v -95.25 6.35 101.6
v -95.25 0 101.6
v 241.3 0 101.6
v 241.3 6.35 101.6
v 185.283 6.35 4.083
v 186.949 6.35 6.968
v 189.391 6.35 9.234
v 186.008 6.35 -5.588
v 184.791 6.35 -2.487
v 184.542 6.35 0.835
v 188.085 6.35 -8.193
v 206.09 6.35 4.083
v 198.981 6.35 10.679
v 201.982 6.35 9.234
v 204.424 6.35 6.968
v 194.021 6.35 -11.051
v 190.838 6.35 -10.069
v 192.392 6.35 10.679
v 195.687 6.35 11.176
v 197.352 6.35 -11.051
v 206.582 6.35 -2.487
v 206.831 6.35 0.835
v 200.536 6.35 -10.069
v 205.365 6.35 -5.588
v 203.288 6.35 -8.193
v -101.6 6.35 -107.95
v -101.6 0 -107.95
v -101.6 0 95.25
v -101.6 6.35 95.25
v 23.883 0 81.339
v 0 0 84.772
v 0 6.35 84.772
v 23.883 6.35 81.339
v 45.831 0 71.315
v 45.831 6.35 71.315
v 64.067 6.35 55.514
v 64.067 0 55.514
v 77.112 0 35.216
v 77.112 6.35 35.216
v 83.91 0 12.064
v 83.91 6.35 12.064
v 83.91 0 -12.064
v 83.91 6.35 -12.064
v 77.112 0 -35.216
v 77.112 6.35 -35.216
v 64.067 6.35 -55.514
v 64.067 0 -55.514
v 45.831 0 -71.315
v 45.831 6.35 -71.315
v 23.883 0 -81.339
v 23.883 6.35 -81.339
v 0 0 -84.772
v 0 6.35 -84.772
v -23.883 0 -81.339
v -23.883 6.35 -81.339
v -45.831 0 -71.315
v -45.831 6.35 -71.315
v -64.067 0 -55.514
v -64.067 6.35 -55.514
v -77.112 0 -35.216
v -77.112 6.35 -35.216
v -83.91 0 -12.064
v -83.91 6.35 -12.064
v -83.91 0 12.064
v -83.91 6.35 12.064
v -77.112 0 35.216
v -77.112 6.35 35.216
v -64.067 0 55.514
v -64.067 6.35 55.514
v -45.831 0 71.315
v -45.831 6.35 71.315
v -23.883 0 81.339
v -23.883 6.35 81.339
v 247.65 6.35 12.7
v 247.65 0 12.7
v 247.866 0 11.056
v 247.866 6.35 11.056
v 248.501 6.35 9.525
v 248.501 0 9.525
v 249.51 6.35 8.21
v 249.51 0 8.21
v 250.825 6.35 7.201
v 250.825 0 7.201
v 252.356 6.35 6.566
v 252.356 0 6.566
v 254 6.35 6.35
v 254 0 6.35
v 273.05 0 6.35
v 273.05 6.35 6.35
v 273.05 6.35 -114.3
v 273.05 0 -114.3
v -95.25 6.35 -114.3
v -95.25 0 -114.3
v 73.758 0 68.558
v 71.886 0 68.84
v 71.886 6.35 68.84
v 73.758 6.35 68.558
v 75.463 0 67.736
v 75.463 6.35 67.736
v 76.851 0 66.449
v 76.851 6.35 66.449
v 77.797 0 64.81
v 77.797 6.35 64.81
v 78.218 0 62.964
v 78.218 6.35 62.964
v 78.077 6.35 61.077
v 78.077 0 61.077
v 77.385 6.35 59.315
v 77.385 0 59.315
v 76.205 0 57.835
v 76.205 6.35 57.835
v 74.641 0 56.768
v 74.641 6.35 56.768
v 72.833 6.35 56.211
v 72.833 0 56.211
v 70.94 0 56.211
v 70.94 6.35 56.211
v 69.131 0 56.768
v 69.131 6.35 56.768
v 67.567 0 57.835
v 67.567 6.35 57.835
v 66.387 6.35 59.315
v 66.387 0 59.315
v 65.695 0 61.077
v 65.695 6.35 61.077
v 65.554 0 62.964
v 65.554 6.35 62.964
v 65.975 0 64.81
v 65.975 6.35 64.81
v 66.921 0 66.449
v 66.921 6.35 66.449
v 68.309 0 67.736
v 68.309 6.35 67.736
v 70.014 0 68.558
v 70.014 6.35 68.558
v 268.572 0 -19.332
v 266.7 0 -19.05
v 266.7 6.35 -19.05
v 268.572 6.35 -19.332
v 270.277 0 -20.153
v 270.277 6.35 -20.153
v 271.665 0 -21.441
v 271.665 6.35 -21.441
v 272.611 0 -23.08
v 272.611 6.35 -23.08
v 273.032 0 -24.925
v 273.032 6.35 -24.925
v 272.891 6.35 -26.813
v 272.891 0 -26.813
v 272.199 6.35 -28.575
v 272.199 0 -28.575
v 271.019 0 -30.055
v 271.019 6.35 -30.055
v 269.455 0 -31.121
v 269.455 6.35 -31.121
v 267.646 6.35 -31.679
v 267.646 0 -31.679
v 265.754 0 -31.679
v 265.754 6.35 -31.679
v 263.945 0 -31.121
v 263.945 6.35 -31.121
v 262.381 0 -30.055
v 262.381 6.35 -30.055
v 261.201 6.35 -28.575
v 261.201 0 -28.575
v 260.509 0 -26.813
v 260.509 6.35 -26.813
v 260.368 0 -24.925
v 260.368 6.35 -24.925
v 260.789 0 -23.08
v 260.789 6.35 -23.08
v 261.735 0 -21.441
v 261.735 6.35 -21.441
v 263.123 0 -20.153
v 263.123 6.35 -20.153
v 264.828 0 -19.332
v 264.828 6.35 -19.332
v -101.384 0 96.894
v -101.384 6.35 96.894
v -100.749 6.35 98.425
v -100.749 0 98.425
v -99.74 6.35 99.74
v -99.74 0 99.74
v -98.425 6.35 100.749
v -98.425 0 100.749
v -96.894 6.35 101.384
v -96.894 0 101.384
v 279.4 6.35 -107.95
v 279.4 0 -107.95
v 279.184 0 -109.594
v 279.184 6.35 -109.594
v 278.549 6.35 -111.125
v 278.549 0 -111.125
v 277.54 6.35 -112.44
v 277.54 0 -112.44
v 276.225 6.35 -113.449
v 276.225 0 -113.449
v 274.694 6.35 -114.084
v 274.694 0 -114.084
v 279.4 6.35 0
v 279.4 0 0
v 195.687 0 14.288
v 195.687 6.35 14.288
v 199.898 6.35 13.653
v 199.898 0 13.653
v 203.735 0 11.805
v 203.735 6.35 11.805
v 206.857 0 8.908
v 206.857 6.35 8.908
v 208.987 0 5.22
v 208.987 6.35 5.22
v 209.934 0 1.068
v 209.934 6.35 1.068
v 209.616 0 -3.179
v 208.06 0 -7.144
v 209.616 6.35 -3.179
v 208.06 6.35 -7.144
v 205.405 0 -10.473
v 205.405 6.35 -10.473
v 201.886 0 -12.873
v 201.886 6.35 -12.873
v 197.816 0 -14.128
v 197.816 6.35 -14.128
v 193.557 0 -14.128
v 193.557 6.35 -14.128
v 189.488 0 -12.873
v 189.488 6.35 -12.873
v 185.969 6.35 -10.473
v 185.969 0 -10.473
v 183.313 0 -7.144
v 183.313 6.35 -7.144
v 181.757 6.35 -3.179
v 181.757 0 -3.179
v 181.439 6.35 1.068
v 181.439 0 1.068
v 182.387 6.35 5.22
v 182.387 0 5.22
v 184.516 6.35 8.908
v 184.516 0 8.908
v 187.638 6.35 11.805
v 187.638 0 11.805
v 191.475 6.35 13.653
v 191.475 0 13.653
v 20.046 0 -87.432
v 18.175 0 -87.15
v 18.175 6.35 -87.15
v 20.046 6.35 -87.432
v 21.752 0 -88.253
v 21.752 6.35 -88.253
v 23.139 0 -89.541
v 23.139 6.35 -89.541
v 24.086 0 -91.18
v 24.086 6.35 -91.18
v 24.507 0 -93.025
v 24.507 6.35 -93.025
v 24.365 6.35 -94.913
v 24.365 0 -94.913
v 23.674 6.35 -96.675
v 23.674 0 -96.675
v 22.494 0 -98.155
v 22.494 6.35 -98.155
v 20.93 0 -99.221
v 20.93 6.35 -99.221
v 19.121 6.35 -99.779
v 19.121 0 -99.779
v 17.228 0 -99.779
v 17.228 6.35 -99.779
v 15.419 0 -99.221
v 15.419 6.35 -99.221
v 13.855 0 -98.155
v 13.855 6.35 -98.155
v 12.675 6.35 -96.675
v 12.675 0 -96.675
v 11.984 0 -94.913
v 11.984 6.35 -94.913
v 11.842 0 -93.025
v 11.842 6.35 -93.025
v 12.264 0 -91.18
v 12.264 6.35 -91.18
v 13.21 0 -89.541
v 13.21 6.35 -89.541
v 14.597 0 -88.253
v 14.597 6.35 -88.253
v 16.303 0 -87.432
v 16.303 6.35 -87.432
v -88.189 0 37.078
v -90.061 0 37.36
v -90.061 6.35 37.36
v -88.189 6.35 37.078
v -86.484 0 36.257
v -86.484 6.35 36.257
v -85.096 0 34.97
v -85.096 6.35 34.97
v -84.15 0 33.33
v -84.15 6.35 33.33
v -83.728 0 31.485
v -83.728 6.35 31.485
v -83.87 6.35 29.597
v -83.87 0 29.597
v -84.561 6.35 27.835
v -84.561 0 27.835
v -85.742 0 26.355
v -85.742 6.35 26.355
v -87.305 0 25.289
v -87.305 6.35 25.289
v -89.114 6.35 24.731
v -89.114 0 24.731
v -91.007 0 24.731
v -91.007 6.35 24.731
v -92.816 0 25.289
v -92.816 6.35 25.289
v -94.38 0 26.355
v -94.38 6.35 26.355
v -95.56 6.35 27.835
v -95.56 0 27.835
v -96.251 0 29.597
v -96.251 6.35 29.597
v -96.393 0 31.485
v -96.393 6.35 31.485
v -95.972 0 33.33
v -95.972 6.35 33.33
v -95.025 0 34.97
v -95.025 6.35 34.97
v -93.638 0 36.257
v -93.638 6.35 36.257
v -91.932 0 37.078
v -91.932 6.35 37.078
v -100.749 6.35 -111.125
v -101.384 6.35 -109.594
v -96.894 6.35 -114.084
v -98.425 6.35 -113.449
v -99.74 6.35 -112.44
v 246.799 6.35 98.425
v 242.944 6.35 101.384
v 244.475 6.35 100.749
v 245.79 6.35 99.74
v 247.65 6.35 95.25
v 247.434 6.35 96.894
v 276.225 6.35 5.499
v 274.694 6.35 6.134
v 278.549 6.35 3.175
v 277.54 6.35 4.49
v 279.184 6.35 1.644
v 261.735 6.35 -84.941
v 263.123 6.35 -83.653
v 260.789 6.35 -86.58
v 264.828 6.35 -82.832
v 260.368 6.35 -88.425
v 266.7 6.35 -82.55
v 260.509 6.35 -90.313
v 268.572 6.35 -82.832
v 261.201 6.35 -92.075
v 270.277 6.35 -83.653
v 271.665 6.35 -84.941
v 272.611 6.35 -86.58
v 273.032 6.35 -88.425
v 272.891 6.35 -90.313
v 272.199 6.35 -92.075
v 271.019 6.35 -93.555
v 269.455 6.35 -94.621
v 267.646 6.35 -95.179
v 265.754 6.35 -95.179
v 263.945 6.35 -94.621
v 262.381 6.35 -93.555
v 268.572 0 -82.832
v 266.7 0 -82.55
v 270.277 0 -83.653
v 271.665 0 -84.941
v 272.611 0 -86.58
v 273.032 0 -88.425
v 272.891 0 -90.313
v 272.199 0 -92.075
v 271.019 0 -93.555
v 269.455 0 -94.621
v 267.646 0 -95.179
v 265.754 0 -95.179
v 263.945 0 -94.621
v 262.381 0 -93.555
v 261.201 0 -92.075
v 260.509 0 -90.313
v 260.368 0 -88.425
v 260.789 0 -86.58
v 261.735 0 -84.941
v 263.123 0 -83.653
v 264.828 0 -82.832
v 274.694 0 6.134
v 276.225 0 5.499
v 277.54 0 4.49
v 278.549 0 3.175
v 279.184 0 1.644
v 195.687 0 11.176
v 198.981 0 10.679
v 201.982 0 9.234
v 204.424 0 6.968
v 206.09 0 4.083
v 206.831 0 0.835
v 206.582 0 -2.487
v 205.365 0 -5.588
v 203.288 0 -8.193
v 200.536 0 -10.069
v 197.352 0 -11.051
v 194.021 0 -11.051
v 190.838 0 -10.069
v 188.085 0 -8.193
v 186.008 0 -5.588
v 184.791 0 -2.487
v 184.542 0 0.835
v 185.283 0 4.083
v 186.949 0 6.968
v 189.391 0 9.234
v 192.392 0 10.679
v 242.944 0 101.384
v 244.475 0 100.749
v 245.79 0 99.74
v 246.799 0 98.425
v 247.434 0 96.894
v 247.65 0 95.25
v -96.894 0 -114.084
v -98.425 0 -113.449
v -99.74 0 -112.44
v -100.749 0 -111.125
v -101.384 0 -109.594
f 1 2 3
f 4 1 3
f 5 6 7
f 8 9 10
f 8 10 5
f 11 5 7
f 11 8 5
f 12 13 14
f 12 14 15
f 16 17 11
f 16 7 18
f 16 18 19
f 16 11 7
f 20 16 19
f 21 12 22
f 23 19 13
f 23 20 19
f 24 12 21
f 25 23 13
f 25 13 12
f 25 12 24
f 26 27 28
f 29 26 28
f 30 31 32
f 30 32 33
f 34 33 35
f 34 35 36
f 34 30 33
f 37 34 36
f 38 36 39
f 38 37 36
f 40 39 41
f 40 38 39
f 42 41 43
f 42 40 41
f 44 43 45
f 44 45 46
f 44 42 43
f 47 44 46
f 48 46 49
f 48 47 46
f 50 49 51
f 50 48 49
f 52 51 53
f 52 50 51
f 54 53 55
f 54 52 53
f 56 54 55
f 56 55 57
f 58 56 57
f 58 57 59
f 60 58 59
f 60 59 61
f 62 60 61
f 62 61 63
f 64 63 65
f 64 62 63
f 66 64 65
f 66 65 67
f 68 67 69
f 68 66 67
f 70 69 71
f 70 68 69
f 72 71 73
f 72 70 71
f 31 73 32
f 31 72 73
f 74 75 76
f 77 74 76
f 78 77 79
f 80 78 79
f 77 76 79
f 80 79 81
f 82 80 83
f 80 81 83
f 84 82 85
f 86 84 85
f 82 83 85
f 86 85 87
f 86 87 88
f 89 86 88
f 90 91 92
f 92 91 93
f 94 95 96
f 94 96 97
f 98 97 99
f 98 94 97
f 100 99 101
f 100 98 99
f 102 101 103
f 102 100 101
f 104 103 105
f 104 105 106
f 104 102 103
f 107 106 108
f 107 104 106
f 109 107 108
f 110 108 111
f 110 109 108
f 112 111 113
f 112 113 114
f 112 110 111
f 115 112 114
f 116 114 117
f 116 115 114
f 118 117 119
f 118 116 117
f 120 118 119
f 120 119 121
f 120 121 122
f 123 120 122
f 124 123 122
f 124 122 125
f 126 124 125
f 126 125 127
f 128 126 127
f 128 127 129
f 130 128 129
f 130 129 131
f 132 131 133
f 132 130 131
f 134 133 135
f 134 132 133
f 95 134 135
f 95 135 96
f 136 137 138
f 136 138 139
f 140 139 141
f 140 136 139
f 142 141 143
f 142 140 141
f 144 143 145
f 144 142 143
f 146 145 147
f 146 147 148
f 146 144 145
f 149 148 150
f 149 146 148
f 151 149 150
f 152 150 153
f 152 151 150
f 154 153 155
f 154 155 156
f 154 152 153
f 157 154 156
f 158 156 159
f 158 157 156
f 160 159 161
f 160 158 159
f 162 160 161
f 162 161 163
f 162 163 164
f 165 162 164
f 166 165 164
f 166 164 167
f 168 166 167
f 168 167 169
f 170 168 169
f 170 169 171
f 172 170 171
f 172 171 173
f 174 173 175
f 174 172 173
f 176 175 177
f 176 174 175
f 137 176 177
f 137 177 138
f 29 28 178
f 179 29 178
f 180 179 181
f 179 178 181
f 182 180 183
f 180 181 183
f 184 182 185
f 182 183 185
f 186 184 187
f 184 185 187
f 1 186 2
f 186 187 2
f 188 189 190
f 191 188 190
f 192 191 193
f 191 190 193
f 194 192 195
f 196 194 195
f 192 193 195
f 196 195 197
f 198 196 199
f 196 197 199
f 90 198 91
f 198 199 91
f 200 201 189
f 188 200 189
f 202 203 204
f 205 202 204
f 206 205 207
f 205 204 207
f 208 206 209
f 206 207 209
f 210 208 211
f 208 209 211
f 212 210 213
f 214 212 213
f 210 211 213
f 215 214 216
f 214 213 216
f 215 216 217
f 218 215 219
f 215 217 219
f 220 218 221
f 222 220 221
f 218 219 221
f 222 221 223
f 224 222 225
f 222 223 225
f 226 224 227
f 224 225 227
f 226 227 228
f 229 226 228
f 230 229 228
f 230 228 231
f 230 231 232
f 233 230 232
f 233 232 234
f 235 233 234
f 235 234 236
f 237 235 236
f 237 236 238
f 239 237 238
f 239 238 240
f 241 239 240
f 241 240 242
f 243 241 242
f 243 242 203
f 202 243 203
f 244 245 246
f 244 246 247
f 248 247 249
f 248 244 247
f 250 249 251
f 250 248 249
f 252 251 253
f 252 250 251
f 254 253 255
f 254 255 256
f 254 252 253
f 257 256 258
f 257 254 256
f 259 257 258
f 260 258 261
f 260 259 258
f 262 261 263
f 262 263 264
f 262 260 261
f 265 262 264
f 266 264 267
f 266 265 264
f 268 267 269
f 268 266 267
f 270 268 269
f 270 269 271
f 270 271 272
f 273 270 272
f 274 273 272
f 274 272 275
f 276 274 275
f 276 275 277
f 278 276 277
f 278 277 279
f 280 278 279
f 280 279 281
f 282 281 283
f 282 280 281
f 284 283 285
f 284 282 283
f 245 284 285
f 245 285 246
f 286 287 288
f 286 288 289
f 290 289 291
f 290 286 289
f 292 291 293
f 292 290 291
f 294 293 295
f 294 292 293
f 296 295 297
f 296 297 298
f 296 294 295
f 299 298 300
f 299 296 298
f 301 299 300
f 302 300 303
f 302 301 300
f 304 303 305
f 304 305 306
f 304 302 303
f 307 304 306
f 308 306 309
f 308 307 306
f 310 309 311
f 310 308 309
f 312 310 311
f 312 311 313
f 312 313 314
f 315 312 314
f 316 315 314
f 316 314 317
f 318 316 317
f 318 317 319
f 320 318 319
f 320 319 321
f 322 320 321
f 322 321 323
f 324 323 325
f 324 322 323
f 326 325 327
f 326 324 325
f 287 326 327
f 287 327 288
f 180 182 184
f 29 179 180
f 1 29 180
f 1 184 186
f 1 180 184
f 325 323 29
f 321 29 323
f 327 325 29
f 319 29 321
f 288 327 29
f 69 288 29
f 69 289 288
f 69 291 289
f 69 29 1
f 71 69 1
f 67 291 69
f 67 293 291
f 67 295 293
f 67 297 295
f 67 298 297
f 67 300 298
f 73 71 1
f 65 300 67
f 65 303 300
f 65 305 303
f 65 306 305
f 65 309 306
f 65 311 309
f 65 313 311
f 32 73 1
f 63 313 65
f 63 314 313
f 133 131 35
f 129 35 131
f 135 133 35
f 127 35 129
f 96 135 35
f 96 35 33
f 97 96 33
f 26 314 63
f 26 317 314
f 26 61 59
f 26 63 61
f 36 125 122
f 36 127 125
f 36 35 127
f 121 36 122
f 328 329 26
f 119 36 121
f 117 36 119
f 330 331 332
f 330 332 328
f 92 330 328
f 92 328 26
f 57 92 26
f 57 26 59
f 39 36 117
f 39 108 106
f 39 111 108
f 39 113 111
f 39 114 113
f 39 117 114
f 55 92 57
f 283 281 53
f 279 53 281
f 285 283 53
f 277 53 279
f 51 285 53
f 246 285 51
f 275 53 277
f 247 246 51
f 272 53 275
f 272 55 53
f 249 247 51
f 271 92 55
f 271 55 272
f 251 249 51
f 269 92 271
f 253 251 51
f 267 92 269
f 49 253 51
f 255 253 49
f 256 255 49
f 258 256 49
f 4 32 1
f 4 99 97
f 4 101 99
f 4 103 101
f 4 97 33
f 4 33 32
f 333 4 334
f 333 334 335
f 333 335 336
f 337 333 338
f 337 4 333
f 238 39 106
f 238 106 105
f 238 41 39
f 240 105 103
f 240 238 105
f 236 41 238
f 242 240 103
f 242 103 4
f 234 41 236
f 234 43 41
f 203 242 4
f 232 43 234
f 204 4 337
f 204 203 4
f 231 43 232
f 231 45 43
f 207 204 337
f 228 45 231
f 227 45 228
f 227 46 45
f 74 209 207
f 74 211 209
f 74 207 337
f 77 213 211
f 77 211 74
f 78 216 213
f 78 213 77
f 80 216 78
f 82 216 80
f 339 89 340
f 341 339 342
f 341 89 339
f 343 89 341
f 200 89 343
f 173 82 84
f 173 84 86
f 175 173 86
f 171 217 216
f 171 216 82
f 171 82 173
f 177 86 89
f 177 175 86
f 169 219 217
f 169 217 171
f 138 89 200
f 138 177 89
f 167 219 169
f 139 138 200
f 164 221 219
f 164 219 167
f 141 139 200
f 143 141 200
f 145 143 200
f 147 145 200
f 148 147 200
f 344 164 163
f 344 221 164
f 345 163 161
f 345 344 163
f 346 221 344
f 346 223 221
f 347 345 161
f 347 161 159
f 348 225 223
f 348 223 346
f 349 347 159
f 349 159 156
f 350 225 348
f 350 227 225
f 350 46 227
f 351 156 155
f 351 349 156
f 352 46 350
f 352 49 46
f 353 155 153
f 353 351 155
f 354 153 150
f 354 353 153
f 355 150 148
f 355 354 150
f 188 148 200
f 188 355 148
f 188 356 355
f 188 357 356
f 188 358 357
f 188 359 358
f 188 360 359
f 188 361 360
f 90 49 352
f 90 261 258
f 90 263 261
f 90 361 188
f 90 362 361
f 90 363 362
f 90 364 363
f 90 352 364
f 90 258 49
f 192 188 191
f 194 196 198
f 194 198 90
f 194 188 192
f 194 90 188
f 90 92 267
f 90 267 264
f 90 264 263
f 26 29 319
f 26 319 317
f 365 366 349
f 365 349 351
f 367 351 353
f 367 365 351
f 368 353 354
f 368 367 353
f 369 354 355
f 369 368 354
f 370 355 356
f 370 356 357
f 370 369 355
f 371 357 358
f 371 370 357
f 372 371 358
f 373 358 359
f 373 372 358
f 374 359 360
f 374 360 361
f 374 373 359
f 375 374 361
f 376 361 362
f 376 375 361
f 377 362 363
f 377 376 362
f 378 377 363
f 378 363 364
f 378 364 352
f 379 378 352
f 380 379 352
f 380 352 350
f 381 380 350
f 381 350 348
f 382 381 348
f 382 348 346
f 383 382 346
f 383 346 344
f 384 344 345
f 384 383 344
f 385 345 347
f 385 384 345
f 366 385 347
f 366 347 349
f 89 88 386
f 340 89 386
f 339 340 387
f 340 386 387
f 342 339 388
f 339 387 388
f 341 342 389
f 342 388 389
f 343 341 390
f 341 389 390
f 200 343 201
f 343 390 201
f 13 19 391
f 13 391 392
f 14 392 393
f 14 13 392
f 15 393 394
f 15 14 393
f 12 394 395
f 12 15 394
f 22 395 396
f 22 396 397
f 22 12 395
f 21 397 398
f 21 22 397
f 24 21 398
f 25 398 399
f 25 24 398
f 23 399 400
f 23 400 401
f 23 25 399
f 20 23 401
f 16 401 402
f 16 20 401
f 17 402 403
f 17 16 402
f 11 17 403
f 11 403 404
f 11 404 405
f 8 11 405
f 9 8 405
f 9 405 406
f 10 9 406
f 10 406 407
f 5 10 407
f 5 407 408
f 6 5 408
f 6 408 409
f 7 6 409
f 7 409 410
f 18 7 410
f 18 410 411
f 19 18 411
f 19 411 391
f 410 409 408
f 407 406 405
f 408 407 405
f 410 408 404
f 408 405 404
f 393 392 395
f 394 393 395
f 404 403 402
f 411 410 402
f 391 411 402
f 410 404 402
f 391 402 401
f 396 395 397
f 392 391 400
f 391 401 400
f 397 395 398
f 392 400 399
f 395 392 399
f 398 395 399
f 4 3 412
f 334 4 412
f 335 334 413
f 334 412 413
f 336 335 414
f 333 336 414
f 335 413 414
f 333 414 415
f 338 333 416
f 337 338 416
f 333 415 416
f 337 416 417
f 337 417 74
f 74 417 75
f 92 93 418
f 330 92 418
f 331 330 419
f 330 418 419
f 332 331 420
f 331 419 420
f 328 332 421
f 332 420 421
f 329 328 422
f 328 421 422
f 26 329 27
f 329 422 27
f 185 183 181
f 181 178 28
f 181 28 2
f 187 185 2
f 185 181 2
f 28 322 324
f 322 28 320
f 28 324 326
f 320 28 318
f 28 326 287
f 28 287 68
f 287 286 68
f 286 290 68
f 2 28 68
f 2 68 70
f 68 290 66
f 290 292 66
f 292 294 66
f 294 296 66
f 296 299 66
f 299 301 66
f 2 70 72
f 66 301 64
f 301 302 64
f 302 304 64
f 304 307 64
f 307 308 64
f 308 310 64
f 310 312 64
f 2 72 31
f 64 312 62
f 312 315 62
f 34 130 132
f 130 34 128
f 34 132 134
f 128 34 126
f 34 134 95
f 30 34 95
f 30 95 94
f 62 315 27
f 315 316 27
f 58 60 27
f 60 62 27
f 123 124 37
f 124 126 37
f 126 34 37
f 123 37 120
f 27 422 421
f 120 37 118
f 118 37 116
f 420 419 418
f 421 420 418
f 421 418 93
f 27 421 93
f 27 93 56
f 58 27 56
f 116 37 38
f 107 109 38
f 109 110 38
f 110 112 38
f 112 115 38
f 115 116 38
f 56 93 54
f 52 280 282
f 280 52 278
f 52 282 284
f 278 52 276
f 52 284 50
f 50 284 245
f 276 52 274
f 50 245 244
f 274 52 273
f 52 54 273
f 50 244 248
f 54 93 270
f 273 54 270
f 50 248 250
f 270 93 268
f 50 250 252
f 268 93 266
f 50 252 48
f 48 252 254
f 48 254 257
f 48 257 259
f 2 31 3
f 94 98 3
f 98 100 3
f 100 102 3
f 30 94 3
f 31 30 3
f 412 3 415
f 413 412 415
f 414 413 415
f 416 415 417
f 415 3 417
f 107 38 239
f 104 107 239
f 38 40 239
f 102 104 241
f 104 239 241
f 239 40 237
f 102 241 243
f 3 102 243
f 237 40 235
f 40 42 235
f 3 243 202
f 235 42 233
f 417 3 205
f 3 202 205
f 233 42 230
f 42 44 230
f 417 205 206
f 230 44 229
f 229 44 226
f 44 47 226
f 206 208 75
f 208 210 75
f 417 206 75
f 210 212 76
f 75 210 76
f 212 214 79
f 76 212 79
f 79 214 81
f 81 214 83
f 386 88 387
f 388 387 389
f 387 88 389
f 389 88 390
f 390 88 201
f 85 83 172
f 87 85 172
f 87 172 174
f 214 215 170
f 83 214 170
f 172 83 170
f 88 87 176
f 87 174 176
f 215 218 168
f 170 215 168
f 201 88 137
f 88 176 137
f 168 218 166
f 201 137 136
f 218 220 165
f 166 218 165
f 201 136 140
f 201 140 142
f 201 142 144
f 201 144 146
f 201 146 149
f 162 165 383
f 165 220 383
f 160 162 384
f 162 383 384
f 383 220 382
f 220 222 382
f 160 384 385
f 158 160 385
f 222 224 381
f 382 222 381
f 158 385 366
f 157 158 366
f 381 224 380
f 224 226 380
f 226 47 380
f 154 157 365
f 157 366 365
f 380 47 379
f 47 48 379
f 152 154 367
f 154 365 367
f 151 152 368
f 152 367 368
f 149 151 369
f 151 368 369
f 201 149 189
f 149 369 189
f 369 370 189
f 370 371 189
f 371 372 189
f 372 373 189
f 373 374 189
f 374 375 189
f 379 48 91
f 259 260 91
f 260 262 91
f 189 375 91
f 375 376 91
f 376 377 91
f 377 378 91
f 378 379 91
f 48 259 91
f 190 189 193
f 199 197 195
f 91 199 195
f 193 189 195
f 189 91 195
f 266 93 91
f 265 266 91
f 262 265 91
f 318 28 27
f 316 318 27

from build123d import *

# Parameters (mm, degrees)
SKETCH1_R           = 84.7725
SKETCH1_R_2         = 6.35
BOSS_EXTRUDE1_DEPTH = 6.35
SKETCH4_R           = 14.2875
SKETCH4_R_2         = 11.176
CUT_EXTRUDE1_DEPTH  = 9.652


with BuildPart() as part:
    # Sketch1 → Boss-Extrude1 (new body)
    with BuildSketch(Plane(origin=(0, 0, 0), x_dir=(1, 0, 0), z_dir=(0, 1, 0))):
        with BuildLine():
            Line((273.05, 114.3), (-95.25, 114.3))
            ThreePointArc((-95.25, 114.3), (-99.740128061, 112.440128061), (-101.6, 107.95))
            Line((-101.6, 107.95), (-101.6, -95.25))
            ThreePointArc((-101.6, -95.25), (-99.740128061, -99.740128061), (-95.25, -101.6))
            Line((-95.25, -101.6), (241.3, -101.6))
            ThreePointArc((241.3, -101.6), (245.790128061, -99.740128061), (247.65, -95.25))
            Line((247.65, -95.25), (247.65, -12.7))
            ThreePointArc((247.65, -12.7), (249.509871939, -8.209871939), (254, -6.35))
            Line((254, -6.35), (273.05, -6.35))
            ThreePointArc((273.05, -6.35), (277.540128061, -4.490128061), (279.4, 0))
            Line((279.4, 0), (279.4, 107.95))
            ThreePointArc((279.4, 107.95), (277.540128061, 112.440128061), (273.05, 114.3))
        make_face()
        with Locations(Location((0, 0, 0), (0, 0, 270))):
            Circle(SKETCH1_R, mode=Mode.SUBTRACT)
        with Locations(Location((-90.060644326, -31.010366712, 0), (0, 0, 270))):
            Circle(SKETCH1_R_2, mode=Mode.SUBTRACT)
        with Locations(Location((18.17455681, 93.499989223, 0), (0, 0, 270))):
            Circle(SKETCH1_R_2, mode=Mode.SUBTRACT)
        with Locations(Location((71.886087516, -62.489622511, 0), (0, 0, 270))):
            Circle(SKETCH1_R_2, mode=Mode.SUBTRACT)
        with Locations(Location((266.7, 88.9, 0), (0, 0, 270))):
            Circle(SKETCH1_R_2, mode=Mode.SUBTRACT)
        with Locations(Location((266.7, 25.4, 0), (0, 0, 270))):
            Circle(SKETCH1_R_2, mode=Mode.SUBTRACT)
    extrude(amount=BOSS_EXTRUDE1_DEPTH)

    # Sketch4 → Cut-Extrude1 (cut)
    with BuildSketch(Plane(origin=(0, 6.35, 0), x_dir=(1, 0, 0), z_dir=(0, 1, 0))):
        with Locations(Location((195.68668, 0, 0), (0, 0, 270))):
            Circle(SKETCH4_R)
        with Locations(Location((195.68668, 0, 0), (0, 0, 270))):
            Circle(SKETCH4_R_2, mode=Mode.SUBTRACT)
    extrude(amount=-CUT_EXTRUDE1_DEPTH, mode=Mode.SUBTRACT)


with BuildPart() as cut_extrude1_piece_1:
    # of the separate pieces the step leaves, piece 1, a body of its own (cut_extrude1_pieces)
    add(part.part.solids().sort_by_distance((273.05, 0, -114.3))[0])


with BuildPart() as cut_extrude1_piece_2:
    # of the separate pieces the step leaves, piece 2, a body of its own (cut_extrude1_pieces)
    add(part.part.solids().sort_by_distance((195.68668, 0, 11.176))[0])


solid = Compound([cut_extrude1_piece_1.part, cut_extrude1_piece_2.part])
